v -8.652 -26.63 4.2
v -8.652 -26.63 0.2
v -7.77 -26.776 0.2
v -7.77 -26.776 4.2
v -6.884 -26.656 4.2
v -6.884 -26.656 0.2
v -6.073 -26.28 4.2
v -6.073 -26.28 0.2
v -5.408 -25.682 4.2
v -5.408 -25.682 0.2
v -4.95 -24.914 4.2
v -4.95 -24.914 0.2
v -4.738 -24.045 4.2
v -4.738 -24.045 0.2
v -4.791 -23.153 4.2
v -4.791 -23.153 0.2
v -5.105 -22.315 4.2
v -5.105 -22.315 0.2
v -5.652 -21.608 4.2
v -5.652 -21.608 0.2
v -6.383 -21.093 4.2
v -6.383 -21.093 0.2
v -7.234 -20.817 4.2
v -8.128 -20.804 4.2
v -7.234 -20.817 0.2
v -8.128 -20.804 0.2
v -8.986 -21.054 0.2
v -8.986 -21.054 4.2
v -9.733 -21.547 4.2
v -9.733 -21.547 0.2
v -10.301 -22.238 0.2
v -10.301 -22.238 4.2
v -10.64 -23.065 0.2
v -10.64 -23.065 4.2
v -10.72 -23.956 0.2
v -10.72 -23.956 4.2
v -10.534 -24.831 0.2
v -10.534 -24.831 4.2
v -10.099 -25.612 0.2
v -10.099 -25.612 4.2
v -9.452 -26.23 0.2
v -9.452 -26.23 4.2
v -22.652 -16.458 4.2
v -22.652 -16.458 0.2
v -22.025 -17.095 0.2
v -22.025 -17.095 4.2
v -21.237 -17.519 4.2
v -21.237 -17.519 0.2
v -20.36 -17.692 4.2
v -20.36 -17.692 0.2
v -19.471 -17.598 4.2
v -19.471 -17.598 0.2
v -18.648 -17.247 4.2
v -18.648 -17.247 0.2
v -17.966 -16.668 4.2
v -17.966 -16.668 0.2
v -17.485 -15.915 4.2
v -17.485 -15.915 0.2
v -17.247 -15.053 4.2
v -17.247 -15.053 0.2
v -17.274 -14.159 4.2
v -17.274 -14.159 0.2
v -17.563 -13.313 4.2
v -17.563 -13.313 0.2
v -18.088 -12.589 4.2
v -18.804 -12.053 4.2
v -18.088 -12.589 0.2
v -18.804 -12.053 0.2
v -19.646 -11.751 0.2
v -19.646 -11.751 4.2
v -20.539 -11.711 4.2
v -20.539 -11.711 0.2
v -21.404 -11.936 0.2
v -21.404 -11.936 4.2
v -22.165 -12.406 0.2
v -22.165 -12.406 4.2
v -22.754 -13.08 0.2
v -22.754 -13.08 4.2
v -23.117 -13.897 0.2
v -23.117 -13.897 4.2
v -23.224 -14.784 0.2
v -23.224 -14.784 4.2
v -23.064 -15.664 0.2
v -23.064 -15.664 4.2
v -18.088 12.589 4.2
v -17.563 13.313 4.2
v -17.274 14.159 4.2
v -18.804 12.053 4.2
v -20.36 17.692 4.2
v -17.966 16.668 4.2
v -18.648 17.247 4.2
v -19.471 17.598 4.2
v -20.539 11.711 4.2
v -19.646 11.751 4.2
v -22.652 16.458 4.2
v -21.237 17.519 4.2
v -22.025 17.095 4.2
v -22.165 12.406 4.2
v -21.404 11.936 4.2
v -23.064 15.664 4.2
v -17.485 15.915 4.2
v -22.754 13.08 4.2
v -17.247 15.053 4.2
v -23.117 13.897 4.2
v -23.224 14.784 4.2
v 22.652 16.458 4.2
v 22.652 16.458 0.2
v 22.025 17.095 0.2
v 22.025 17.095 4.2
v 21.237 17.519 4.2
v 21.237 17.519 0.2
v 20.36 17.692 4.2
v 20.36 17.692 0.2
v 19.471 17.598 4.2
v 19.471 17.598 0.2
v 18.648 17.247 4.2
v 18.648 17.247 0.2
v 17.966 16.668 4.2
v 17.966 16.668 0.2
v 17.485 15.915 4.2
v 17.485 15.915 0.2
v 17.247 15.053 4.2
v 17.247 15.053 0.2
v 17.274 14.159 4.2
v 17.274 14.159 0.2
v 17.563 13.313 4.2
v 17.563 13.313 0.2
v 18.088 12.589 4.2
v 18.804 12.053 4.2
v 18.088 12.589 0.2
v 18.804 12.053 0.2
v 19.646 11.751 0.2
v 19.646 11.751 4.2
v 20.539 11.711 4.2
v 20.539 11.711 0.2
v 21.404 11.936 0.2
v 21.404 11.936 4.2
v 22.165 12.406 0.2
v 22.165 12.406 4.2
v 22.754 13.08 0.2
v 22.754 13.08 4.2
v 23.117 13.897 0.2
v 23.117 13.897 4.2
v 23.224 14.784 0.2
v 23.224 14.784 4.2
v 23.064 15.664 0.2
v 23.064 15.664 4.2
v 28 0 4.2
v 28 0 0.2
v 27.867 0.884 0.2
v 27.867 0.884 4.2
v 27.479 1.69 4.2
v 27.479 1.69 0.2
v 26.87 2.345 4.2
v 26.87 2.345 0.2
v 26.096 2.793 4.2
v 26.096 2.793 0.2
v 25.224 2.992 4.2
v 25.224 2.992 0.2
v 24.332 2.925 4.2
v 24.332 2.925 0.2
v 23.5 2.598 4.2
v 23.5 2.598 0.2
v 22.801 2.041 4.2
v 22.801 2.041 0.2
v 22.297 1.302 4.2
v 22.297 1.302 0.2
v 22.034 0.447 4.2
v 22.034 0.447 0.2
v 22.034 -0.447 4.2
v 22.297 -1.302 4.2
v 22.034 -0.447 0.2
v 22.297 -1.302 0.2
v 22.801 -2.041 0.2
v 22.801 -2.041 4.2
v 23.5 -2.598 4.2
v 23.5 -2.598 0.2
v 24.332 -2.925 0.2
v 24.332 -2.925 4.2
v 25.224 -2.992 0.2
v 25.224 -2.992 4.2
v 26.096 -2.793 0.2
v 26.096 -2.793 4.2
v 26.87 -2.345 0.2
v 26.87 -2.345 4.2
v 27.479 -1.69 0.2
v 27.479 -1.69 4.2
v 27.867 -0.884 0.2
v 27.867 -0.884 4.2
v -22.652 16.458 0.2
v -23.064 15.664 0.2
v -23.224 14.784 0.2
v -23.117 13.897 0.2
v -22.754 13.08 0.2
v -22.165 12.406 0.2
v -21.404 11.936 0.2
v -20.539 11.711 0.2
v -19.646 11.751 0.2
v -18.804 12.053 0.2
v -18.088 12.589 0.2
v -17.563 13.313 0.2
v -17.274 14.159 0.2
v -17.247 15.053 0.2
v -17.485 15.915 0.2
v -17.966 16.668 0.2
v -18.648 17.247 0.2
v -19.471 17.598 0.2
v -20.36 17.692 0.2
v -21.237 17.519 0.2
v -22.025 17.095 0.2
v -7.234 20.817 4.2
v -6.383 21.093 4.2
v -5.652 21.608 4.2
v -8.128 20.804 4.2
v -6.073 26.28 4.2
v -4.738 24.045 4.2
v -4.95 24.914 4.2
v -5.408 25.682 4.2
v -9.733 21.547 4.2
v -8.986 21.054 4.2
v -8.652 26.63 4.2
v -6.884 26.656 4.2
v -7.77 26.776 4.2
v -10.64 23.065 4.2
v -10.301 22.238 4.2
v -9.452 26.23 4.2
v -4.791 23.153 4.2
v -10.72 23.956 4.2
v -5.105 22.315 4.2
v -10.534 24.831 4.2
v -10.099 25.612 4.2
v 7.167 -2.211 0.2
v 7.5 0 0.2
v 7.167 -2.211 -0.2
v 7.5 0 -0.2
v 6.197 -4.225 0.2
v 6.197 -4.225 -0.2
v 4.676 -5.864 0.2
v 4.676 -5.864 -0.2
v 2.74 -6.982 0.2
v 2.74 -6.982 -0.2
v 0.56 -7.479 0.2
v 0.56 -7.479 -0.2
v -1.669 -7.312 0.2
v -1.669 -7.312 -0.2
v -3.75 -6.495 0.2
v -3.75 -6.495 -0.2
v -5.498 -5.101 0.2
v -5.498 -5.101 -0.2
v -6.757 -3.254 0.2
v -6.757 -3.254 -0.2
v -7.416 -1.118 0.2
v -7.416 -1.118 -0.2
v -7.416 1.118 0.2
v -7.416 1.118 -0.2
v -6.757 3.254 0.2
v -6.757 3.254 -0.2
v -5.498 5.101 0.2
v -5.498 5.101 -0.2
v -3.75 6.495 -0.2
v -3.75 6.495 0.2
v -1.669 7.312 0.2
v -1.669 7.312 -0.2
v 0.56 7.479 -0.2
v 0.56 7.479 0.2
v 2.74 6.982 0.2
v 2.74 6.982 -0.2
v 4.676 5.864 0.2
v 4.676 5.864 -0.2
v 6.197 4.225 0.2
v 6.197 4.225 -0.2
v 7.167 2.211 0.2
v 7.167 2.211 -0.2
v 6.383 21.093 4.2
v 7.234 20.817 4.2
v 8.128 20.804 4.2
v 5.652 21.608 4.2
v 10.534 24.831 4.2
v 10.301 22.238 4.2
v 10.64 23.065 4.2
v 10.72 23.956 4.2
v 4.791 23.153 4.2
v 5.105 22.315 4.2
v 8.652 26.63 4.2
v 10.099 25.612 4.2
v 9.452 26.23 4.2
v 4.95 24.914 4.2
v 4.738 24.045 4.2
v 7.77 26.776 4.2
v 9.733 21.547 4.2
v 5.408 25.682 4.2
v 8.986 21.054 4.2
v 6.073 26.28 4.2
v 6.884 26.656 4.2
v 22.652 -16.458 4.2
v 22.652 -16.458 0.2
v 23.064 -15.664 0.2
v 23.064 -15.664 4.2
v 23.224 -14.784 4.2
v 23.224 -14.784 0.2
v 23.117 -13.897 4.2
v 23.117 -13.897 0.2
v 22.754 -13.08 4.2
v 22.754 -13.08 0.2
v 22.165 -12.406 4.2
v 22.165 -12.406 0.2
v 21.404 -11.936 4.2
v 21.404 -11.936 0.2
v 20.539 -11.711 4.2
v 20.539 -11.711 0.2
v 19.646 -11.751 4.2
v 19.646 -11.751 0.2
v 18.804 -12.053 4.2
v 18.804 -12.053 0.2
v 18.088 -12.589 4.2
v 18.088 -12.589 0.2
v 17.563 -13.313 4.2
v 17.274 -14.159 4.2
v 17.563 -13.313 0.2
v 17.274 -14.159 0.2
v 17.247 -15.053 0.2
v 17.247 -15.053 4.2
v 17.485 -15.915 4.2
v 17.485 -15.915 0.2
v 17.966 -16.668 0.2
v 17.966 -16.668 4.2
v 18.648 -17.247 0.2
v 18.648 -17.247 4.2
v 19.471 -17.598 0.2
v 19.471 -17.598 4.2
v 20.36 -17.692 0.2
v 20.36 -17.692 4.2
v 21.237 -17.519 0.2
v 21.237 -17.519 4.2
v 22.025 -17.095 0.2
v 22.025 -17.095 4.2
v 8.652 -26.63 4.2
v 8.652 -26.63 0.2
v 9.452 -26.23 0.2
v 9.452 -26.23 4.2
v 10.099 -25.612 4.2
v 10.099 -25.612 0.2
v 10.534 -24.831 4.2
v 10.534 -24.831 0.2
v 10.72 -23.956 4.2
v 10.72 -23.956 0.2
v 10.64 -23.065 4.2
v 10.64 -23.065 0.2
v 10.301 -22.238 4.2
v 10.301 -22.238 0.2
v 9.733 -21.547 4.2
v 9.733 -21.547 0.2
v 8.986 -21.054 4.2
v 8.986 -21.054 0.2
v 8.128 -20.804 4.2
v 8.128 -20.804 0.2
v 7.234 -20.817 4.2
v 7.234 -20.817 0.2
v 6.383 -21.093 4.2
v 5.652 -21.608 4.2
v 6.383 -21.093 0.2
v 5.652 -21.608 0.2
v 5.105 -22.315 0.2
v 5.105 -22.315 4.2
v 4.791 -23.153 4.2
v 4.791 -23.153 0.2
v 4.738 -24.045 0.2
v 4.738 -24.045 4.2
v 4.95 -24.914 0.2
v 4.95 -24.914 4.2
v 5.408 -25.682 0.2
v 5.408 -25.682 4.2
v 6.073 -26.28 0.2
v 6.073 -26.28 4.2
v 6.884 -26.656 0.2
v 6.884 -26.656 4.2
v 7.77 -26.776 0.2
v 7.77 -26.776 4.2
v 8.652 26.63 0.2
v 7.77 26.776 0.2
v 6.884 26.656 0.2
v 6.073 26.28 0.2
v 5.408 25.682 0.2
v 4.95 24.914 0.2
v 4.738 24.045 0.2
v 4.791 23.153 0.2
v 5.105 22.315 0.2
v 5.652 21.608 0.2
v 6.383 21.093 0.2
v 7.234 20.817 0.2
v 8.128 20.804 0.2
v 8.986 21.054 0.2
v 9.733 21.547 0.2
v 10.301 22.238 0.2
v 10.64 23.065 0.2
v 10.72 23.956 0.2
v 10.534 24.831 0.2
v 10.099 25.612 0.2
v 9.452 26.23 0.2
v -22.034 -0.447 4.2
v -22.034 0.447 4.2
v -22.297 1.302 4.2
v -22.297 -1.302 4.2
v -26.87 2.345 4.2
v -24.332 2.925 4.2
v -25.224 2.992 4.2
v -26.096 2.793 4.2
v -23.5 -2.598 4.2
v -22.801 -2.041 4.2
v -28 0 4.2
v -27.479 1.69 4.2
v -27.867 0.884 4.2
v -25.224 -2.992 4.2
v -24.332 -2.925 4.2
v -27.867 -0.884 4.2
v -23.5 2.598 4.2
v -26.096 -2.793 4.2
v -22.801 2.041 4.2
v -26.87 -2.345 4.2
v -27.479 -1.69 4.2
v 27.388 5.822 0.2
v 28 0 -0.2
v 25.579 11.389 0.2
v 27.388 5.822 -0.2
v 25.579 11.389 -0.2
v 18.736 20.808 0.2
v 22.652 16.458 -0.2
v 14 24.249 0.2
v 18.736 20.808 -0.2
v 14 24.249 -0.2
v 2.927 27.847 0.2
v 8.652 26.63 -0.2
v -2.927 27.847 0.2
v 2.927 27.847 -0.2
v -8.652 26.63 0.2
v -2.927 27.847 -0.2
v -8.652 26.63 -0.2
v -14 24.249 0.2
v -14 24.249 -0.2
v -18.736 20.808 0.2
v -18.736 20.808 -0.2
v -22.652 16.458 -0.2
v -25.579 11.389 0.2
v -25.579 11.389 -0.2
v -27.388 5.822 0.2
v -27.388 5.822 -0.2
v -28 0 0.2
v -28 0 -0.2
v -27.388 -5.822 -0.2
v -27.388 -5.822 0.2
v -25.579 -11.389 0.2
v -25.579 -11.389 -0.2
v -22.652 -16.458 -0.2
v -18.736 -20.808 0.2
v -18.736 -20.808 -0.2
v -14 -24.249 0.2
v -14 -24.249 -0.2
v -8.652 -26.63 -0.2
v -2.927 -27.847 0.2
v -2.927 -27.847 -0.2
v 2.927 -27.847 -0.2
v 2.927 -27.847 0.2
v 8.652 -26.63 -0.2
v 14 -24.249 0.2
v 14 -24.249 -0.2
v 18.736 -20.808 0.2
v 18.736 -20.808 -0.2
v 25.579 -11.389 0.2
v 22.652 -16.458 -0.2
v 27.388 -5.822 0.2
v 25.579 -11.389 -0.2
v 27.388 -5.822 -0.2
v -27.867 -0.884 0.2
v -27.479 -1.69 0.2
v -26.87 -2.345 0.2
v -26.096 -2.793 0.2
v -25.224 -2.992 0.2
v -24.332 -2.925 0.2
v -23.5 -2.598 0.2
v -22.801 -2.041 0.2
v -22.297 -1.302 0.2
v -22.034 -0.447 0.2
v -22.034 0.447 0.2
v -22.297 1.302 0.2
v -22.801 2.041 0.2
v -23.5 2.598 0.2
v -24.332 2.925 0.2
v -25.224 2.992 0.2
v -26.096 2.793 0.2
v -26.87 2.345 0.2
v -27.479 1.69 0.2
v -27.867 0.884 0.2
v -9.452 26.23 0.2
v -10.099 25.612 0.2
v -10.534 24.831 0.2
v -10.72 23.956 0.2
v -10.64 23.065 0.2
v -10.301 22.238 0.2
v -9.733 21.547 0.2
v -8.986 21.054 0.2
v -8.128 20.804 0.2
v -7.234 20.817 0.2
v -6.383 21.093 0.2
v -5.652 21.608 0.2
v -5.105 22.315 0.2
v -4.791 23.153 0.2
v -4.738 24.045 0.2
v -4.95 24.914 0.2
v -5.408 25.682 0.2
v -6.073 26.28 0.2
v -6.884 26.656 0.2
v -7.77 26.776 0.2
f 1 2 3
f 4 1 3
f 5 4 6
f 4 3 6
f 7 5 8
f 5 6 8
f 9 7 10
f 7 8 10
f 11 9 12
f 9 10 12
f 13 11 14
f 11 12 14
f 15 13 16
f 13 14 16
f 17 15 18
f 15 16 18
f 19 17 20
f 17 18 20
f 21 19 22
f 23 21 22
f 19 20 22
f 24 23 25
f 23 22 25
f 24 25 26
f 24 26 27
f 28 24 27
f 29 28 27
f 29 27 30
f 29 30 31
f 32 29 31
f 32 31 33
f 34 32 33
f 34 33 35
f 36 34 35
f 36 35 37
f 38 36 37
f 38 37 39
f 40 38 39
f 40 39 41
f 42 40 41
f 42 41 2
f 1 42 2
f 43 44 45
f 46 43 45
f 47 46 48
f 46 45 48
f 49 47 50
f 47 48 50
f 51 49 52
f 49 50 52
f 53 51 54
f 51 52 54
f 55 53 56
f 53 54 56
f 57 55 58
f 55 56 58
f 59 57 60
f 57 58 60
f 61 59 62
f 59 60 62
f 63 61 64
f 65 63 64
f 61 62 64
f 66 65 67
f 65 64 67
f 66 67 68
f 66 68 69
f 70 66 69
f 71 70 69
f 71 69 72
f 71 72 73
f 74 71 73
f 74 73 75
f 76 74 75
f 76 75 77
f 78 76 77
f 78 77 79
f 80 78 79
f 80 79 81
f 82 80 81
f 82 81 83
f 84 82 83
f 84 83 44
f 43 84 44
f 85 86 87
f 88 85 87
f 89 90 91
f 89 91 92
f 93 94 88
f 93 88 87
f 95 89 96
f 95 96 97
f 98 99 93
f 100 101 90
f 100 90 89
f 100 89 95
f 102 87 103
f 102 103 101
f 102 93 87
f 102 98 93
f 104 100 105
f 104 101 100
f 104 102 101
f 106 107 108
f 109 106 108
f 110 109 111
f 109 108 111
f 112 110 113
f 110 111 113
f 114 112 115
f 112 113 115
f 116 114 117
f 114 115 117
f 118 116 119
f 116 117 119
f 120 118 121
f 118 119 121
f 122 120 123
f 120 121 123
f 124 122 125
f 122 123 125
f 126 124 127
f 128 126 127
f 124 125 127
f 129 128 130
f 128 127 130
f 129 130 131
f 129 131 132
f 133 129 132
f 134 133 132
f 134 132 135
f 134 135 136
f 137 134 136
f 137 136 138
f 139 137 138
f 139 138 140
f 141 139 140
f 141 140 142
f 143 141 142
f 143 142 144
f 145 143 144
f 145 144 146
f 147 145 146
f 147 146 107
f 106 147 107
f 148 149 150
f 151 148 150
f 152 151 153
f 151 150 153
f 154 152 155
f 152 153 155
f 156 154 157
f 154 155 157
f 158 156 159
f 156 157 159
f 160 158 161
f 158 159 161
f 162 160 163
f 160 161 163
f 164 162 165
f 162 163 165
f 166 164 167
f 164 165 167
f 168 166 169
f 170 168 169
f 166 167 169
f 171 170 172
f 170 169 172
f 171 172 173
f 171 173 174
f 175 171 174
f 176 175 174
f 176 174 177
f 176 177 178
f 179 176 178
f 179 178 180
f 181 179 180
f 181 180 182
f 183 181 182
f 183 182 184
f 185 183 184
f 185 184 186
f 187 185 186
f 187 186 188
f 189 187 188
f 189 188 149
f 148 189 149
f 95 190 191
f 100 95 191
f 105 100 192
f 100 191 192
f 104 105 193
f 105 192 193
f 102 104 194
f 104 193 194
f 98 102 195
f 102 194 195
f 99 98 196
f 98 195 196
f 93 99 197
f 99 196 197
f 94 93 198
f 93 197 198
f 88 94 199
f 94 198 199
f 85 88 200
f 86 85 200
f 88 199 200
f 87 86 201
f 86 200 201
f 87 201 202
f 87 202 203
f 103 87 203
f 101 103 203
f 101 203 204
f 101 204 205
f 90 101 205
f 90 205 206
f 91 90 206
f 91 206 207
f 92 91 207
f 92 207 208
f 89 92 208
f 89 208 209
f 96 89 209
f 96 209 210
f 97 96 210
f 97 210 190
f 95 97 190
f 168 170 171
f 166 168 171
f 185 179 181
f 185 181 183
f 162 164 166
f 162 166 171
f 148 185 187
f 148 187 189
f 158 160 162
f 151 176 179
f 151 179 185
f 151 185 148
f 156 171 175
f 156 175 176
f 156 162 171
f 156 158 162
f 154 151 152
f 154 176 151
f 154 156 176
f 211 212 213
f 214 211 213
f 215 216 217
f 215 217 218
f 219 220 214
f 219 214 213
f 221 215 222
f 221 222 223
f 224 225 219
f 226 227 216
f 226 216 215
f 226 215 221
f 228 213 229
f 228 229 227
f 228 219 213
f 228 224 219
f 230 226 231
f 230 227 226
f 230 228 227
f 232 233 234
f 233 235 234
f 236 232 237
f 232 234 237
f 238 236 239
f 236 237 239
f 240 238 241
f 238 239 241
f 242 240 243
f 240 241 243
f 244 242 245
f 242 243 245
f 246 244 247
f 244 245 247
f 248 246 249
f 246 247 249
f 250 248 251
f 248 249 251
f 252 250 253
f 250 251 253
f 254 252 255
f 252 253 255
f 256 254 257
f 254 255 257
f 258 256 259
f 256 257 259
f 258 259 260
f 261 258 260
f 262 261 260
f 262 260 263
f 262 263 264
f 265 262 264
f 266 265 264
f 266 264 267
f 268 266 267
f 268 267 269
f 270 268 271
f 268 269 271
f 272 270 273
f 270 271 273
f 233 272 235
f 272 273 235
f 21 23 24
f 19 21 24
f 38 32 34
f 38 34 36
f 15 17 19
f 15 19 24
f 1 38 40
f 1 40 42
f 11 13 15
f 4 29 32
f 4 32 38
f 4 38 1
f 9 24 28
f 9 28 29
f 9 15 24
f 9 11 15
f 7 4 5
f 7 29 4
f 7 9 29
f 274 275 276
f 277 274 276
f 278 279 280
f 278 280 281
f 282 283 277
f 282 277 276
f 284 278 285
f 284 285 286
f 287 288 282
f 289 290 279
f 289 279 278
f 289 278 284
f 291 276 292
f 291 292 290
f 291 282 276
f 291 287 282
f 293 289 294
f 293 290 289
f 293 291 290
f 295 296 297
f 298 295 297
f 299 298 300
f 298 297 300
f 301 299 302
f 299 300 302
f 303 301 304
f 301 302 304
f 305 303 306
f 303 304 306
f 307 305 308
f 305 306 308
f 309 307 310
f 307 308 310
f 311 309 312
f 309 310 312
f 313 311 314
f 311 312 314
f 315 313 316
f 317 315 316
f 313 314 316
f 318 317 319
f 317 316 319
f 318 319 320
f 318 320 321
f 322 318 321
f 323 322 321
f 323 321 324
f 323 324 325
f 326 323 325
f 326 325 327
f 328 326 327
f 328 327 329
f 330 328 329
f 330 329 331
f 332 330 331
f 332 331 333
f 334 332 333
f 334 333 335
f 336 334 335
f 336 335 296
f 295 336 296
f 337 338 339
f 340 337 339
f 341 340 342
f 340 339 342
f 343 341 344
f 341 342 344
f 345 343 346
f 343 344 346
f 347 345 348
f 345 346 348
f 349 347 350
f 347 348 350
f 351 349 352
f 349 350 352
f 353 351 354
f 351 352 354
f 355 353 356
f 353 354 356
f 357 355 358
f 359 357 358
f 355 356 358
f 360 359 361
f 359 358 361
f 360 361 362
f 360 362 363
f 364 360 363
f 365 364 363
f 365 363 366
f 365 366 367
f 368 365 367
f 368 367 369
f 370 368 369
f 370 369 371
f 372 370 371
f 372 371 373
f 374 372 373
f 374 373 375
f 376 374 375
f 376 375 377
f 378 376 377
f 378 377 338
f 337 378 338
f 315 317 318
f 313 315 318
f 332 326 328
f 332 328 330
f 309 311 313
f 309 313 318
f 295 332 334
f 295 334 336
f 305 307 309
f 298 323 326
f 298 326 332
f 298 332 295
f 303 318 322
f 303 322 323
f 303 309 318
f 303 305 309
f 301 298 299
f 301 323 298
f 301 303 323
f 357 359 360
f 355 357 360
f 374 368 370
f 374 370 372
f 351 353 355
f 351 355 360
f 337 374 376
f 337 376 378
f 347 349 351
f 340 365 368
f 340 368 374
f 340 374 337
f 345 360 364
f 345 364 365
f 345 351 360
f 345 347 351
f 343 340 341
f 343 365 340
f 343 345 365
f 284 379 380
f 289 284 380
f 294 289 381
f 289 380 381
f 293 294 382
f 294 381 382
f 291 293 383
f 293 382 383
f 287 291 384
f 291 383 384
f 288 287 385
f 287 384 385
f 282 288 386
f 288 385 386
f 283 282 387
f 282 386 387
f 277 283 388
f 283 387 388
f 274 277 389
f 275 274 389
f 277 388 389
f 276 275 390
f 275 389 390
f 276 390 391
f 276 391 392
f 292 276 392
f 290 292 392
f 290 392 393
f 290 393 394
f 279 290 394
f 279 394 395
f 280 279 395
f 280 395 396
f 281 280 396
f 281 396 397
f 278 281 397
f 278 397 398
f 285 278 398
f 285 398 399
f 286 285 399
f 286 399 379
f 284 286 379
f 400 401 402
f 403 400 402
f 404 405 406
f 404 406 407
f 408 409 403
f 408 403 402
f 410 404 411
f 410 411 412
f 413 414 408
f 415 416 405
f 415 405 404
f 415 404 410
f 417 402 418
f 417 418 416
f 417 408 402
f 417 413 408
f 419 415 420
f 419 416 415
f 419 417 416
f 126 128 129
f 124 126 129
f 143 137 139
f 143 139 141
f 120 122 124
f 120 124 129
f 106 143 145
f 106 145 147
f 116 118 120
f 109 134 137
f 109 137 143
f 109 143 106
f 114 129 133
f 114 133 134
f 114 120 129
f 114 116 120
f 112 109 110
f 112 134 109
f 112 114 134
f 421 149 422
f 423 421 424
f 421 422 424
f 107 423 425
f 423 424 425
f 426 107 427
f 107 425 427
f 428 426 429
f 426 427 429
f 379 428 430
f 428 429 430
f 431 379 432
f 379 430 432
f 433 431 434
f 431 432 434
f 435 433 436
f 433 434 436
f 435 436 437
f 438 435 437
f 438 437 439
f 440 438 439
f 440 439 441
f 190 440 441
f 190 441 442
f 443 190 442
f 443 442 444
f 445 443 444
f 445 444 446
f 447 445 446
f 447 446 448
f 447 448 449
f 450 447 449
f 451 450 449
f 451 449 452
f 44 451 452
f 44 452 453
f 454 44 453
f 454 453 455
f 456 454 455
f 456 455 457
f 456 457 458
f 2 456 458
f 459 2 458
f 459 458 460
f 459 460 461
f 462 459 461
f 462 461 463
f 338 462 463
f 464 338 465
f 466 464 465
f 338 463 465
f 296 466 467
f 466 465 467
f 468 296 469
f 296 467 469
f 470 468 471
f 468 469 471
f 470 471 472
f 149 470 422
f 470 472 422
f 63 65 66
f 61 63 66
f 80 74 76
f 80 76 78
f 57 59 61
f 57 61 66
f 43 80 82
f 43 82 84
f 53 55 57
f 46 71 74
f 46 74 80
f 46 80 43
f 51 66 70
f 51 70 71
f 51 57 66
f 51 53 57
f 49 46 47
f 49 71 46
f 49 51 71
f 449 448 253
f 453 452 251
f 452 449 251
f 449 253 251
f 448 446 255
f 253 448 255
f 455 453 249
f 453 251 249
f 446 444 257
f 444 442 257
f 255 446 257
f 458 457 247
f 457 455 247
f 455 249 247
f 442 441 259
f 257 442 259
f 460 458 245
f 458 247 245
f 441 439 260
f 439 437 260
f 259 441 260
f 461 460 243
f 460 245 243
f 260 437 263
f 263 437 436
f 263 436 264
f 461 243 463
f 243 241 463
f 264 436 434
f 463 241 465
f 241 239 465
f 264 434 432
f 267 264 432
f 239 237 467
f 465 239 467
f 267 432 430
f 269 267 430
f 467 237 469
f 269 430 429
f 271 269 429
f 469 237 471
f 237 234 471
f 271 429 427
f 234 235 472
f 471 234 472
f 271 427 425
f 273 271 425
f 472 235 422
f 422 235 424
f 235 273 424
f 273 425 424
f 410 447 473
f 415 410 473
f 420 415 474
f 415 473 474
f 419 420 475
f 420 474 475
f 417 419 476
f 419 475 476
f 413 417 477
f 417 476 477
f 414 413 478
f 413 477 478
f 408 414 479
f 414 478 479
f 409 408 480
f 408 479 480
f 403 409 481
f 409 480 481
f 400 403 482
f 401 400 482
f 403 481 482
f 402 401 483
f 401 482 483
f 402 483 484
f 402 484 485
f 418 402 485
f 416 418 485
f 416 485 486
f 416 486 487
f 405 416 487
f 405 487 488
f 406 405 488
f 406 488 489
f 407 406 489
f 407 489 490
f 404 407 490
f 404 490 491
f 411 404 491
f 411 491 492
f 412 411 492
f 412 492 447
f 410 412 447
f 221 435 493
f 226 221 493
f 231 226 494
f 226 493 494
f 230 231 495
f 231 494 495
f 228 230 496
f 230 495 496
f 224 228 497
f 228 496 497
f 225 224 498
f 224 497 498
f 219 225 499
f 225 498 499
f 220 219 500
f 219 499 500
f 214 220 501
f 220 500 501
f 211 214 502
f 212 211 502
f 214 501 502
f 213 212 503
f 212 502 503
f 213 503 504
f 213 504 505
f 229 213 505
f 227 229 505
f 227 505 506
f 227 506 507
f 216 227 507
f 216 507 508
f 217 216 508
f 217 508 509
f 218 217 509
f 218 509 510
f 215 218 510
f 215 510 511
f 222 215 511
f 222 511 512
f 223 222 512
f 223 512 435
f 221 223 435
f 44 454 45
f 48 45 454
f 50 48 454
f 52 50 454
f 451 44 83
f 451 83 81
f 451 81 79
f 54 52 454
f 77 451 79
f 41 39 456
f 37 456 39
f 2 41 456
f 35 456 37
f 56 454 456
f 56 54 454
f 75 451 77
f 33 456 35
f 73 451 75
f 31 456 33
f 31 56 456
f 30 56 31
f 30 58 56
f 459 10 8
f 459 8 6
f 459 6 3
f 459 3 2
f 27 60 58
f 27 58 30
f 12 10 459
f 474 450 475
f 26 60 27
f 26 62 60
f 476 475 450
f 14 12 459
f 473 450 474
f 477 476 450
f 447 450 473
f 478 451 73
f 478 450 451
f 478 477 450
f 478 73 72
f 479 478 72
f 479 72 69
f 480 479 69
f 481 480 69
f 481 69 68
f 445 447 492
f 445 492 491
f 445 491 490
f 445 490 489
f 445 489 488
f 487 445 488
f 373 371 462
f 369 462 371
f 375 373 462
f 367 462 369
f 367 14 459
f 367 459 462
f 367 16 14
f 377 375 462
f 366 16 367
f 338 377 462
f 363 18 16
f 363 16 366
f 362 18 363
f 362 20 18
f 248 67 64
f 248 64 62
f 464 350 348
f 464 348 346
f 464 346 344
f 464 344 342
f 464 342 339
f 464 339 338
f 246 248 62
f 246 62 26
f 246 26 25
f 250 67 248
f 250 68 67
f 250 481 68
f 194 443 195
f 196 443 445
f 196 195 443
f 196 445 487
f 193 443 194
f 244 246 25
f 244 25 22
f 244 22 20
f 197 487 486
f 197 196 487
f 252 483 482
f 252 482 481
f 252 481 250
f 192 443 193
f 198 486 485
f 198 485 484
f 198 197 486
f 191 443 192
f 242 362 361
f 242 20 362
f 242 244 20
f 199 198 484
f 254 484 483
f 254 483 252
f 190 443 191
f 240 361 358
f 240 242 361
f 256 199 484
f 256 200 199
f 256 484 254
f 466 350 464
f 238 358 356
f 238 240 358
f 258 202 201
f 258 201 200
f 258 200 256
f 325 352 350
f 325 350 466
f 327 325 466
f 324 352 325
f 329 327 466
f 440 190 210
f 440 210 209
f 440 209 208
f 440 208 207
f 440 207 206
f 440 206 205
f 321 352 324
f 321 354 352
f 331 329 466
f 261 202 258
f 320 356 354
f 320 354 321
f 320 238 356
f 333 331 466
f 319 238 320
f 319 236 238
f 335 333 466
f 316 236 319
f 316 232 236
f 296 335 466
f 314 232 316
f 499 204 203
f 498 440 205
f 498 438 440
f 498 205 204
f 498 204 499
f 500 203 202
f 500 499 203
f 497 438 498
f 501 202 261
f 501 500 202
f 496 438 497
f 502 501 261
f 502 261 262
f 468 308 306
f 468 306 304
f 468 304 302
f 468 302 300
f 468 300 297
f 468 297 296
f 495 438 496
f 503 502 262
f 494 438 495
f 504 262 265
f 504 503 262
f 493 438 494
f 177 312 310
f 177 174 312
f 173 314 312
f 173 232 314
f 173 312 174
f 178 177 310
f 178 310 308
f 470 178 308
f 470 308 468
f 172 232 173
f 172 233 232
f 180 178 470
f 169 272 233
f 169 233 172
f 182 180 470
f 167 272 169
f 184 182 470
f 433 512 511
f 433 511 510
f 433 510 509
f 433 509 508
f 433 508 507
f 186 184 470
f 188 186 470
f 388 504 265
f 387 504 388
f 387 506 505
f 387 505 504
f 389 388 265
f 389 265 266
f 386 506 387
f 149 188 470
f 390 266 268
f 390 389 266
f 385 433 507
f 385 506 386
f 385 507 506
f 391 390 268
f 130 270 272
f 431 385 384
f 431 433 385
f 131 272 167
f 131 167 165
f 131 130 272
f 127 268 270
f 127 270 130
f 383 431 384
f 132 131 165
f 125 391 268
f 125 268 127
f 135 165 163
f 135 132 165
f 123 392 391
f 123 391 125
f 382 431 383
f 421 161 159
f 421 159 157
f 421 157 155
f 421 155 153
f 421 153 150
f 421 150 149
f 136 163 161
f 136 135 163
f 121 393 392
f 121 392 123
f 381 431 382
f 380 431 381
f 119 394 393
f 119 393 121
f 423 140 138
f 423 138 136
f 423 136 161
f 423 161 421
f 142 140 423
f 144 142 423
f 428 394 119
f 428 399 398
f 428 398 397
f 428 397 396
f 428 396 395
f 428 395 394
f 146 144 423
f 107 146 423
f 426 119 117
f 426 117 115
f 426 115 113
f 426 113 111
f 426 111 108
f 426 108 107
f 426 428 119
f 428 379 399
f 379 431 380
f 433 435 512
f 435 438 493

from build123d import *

# Parameters (mm, degrees)
PINSBASEEXTRUDE_DEPTH      = 0.2
PINSBASEEXTRUDE_DEPTH_BACK = 0.2
PINSBASESKETCH_R           = 28
PINSEXTRUDE_START          = -0.2
PINSSKETCH_R               = 3
PINSEXTRUDE_DEPTH          = 4.4
PINSPATTERN_COUNT          = 10
BOREREVOLVESKETCH_W        = 4
BOREREVOLVESKETCH_H        = 7.5


with BuildPart() as part:
    # PinsBaseSketch → PinsBaseExtrude (new, two sides: drawn at the far end of the back side and taken through both)
    with BuildSketch(Plane.XY.offset(-PINSBASEEXTRUDE_DEPTH_BACK)):
        Circle(PINSBASESKETCH_R)
    extrude(amount=PINSBASEEXTRUDE_DEPTH + PINSBASEEXTRUDE_DEPTH_BACK)

    # PinsSketch → PinsExtrude (add)
    with BuildSketch(Plane.XY.offset(PINSEXTRUDE_START)):
        with Locations((25, 0)):
            Circle(PINSSKETCH_R)
    pinsextrude = extrude(amount=PINSEXTRUDE_DEPTH)

    # PinsPattern: PinsExtrude ×10 about axis
    pinspattern_axis = Axis((0, 0, 55), (0, 0, -1))
    for i in range(1, PINSPATTERN_COUNT):
        add(pinsextrude.rotate(pinspattern_axis, i * 360 / PINSPATTERN_COUNT))

    # BoreRevolveSketch → BoreRevolveCut (revolve, cut)
    with BuildSketch(Plane(origin=(0, 0, 0), x_dir=(0, 0, -1), z_dir=(1, 0, 0))):
        with Locations((0, 3.75)):
            Rectangle(BOREREVOLVESKETCH_W, BOREREVOLVESKETCH_H)
    revolve(axis=Axis((0, 0, 0), (0, 0, -1)), mode=Mode.SUBTRACT)


solid = part.part
